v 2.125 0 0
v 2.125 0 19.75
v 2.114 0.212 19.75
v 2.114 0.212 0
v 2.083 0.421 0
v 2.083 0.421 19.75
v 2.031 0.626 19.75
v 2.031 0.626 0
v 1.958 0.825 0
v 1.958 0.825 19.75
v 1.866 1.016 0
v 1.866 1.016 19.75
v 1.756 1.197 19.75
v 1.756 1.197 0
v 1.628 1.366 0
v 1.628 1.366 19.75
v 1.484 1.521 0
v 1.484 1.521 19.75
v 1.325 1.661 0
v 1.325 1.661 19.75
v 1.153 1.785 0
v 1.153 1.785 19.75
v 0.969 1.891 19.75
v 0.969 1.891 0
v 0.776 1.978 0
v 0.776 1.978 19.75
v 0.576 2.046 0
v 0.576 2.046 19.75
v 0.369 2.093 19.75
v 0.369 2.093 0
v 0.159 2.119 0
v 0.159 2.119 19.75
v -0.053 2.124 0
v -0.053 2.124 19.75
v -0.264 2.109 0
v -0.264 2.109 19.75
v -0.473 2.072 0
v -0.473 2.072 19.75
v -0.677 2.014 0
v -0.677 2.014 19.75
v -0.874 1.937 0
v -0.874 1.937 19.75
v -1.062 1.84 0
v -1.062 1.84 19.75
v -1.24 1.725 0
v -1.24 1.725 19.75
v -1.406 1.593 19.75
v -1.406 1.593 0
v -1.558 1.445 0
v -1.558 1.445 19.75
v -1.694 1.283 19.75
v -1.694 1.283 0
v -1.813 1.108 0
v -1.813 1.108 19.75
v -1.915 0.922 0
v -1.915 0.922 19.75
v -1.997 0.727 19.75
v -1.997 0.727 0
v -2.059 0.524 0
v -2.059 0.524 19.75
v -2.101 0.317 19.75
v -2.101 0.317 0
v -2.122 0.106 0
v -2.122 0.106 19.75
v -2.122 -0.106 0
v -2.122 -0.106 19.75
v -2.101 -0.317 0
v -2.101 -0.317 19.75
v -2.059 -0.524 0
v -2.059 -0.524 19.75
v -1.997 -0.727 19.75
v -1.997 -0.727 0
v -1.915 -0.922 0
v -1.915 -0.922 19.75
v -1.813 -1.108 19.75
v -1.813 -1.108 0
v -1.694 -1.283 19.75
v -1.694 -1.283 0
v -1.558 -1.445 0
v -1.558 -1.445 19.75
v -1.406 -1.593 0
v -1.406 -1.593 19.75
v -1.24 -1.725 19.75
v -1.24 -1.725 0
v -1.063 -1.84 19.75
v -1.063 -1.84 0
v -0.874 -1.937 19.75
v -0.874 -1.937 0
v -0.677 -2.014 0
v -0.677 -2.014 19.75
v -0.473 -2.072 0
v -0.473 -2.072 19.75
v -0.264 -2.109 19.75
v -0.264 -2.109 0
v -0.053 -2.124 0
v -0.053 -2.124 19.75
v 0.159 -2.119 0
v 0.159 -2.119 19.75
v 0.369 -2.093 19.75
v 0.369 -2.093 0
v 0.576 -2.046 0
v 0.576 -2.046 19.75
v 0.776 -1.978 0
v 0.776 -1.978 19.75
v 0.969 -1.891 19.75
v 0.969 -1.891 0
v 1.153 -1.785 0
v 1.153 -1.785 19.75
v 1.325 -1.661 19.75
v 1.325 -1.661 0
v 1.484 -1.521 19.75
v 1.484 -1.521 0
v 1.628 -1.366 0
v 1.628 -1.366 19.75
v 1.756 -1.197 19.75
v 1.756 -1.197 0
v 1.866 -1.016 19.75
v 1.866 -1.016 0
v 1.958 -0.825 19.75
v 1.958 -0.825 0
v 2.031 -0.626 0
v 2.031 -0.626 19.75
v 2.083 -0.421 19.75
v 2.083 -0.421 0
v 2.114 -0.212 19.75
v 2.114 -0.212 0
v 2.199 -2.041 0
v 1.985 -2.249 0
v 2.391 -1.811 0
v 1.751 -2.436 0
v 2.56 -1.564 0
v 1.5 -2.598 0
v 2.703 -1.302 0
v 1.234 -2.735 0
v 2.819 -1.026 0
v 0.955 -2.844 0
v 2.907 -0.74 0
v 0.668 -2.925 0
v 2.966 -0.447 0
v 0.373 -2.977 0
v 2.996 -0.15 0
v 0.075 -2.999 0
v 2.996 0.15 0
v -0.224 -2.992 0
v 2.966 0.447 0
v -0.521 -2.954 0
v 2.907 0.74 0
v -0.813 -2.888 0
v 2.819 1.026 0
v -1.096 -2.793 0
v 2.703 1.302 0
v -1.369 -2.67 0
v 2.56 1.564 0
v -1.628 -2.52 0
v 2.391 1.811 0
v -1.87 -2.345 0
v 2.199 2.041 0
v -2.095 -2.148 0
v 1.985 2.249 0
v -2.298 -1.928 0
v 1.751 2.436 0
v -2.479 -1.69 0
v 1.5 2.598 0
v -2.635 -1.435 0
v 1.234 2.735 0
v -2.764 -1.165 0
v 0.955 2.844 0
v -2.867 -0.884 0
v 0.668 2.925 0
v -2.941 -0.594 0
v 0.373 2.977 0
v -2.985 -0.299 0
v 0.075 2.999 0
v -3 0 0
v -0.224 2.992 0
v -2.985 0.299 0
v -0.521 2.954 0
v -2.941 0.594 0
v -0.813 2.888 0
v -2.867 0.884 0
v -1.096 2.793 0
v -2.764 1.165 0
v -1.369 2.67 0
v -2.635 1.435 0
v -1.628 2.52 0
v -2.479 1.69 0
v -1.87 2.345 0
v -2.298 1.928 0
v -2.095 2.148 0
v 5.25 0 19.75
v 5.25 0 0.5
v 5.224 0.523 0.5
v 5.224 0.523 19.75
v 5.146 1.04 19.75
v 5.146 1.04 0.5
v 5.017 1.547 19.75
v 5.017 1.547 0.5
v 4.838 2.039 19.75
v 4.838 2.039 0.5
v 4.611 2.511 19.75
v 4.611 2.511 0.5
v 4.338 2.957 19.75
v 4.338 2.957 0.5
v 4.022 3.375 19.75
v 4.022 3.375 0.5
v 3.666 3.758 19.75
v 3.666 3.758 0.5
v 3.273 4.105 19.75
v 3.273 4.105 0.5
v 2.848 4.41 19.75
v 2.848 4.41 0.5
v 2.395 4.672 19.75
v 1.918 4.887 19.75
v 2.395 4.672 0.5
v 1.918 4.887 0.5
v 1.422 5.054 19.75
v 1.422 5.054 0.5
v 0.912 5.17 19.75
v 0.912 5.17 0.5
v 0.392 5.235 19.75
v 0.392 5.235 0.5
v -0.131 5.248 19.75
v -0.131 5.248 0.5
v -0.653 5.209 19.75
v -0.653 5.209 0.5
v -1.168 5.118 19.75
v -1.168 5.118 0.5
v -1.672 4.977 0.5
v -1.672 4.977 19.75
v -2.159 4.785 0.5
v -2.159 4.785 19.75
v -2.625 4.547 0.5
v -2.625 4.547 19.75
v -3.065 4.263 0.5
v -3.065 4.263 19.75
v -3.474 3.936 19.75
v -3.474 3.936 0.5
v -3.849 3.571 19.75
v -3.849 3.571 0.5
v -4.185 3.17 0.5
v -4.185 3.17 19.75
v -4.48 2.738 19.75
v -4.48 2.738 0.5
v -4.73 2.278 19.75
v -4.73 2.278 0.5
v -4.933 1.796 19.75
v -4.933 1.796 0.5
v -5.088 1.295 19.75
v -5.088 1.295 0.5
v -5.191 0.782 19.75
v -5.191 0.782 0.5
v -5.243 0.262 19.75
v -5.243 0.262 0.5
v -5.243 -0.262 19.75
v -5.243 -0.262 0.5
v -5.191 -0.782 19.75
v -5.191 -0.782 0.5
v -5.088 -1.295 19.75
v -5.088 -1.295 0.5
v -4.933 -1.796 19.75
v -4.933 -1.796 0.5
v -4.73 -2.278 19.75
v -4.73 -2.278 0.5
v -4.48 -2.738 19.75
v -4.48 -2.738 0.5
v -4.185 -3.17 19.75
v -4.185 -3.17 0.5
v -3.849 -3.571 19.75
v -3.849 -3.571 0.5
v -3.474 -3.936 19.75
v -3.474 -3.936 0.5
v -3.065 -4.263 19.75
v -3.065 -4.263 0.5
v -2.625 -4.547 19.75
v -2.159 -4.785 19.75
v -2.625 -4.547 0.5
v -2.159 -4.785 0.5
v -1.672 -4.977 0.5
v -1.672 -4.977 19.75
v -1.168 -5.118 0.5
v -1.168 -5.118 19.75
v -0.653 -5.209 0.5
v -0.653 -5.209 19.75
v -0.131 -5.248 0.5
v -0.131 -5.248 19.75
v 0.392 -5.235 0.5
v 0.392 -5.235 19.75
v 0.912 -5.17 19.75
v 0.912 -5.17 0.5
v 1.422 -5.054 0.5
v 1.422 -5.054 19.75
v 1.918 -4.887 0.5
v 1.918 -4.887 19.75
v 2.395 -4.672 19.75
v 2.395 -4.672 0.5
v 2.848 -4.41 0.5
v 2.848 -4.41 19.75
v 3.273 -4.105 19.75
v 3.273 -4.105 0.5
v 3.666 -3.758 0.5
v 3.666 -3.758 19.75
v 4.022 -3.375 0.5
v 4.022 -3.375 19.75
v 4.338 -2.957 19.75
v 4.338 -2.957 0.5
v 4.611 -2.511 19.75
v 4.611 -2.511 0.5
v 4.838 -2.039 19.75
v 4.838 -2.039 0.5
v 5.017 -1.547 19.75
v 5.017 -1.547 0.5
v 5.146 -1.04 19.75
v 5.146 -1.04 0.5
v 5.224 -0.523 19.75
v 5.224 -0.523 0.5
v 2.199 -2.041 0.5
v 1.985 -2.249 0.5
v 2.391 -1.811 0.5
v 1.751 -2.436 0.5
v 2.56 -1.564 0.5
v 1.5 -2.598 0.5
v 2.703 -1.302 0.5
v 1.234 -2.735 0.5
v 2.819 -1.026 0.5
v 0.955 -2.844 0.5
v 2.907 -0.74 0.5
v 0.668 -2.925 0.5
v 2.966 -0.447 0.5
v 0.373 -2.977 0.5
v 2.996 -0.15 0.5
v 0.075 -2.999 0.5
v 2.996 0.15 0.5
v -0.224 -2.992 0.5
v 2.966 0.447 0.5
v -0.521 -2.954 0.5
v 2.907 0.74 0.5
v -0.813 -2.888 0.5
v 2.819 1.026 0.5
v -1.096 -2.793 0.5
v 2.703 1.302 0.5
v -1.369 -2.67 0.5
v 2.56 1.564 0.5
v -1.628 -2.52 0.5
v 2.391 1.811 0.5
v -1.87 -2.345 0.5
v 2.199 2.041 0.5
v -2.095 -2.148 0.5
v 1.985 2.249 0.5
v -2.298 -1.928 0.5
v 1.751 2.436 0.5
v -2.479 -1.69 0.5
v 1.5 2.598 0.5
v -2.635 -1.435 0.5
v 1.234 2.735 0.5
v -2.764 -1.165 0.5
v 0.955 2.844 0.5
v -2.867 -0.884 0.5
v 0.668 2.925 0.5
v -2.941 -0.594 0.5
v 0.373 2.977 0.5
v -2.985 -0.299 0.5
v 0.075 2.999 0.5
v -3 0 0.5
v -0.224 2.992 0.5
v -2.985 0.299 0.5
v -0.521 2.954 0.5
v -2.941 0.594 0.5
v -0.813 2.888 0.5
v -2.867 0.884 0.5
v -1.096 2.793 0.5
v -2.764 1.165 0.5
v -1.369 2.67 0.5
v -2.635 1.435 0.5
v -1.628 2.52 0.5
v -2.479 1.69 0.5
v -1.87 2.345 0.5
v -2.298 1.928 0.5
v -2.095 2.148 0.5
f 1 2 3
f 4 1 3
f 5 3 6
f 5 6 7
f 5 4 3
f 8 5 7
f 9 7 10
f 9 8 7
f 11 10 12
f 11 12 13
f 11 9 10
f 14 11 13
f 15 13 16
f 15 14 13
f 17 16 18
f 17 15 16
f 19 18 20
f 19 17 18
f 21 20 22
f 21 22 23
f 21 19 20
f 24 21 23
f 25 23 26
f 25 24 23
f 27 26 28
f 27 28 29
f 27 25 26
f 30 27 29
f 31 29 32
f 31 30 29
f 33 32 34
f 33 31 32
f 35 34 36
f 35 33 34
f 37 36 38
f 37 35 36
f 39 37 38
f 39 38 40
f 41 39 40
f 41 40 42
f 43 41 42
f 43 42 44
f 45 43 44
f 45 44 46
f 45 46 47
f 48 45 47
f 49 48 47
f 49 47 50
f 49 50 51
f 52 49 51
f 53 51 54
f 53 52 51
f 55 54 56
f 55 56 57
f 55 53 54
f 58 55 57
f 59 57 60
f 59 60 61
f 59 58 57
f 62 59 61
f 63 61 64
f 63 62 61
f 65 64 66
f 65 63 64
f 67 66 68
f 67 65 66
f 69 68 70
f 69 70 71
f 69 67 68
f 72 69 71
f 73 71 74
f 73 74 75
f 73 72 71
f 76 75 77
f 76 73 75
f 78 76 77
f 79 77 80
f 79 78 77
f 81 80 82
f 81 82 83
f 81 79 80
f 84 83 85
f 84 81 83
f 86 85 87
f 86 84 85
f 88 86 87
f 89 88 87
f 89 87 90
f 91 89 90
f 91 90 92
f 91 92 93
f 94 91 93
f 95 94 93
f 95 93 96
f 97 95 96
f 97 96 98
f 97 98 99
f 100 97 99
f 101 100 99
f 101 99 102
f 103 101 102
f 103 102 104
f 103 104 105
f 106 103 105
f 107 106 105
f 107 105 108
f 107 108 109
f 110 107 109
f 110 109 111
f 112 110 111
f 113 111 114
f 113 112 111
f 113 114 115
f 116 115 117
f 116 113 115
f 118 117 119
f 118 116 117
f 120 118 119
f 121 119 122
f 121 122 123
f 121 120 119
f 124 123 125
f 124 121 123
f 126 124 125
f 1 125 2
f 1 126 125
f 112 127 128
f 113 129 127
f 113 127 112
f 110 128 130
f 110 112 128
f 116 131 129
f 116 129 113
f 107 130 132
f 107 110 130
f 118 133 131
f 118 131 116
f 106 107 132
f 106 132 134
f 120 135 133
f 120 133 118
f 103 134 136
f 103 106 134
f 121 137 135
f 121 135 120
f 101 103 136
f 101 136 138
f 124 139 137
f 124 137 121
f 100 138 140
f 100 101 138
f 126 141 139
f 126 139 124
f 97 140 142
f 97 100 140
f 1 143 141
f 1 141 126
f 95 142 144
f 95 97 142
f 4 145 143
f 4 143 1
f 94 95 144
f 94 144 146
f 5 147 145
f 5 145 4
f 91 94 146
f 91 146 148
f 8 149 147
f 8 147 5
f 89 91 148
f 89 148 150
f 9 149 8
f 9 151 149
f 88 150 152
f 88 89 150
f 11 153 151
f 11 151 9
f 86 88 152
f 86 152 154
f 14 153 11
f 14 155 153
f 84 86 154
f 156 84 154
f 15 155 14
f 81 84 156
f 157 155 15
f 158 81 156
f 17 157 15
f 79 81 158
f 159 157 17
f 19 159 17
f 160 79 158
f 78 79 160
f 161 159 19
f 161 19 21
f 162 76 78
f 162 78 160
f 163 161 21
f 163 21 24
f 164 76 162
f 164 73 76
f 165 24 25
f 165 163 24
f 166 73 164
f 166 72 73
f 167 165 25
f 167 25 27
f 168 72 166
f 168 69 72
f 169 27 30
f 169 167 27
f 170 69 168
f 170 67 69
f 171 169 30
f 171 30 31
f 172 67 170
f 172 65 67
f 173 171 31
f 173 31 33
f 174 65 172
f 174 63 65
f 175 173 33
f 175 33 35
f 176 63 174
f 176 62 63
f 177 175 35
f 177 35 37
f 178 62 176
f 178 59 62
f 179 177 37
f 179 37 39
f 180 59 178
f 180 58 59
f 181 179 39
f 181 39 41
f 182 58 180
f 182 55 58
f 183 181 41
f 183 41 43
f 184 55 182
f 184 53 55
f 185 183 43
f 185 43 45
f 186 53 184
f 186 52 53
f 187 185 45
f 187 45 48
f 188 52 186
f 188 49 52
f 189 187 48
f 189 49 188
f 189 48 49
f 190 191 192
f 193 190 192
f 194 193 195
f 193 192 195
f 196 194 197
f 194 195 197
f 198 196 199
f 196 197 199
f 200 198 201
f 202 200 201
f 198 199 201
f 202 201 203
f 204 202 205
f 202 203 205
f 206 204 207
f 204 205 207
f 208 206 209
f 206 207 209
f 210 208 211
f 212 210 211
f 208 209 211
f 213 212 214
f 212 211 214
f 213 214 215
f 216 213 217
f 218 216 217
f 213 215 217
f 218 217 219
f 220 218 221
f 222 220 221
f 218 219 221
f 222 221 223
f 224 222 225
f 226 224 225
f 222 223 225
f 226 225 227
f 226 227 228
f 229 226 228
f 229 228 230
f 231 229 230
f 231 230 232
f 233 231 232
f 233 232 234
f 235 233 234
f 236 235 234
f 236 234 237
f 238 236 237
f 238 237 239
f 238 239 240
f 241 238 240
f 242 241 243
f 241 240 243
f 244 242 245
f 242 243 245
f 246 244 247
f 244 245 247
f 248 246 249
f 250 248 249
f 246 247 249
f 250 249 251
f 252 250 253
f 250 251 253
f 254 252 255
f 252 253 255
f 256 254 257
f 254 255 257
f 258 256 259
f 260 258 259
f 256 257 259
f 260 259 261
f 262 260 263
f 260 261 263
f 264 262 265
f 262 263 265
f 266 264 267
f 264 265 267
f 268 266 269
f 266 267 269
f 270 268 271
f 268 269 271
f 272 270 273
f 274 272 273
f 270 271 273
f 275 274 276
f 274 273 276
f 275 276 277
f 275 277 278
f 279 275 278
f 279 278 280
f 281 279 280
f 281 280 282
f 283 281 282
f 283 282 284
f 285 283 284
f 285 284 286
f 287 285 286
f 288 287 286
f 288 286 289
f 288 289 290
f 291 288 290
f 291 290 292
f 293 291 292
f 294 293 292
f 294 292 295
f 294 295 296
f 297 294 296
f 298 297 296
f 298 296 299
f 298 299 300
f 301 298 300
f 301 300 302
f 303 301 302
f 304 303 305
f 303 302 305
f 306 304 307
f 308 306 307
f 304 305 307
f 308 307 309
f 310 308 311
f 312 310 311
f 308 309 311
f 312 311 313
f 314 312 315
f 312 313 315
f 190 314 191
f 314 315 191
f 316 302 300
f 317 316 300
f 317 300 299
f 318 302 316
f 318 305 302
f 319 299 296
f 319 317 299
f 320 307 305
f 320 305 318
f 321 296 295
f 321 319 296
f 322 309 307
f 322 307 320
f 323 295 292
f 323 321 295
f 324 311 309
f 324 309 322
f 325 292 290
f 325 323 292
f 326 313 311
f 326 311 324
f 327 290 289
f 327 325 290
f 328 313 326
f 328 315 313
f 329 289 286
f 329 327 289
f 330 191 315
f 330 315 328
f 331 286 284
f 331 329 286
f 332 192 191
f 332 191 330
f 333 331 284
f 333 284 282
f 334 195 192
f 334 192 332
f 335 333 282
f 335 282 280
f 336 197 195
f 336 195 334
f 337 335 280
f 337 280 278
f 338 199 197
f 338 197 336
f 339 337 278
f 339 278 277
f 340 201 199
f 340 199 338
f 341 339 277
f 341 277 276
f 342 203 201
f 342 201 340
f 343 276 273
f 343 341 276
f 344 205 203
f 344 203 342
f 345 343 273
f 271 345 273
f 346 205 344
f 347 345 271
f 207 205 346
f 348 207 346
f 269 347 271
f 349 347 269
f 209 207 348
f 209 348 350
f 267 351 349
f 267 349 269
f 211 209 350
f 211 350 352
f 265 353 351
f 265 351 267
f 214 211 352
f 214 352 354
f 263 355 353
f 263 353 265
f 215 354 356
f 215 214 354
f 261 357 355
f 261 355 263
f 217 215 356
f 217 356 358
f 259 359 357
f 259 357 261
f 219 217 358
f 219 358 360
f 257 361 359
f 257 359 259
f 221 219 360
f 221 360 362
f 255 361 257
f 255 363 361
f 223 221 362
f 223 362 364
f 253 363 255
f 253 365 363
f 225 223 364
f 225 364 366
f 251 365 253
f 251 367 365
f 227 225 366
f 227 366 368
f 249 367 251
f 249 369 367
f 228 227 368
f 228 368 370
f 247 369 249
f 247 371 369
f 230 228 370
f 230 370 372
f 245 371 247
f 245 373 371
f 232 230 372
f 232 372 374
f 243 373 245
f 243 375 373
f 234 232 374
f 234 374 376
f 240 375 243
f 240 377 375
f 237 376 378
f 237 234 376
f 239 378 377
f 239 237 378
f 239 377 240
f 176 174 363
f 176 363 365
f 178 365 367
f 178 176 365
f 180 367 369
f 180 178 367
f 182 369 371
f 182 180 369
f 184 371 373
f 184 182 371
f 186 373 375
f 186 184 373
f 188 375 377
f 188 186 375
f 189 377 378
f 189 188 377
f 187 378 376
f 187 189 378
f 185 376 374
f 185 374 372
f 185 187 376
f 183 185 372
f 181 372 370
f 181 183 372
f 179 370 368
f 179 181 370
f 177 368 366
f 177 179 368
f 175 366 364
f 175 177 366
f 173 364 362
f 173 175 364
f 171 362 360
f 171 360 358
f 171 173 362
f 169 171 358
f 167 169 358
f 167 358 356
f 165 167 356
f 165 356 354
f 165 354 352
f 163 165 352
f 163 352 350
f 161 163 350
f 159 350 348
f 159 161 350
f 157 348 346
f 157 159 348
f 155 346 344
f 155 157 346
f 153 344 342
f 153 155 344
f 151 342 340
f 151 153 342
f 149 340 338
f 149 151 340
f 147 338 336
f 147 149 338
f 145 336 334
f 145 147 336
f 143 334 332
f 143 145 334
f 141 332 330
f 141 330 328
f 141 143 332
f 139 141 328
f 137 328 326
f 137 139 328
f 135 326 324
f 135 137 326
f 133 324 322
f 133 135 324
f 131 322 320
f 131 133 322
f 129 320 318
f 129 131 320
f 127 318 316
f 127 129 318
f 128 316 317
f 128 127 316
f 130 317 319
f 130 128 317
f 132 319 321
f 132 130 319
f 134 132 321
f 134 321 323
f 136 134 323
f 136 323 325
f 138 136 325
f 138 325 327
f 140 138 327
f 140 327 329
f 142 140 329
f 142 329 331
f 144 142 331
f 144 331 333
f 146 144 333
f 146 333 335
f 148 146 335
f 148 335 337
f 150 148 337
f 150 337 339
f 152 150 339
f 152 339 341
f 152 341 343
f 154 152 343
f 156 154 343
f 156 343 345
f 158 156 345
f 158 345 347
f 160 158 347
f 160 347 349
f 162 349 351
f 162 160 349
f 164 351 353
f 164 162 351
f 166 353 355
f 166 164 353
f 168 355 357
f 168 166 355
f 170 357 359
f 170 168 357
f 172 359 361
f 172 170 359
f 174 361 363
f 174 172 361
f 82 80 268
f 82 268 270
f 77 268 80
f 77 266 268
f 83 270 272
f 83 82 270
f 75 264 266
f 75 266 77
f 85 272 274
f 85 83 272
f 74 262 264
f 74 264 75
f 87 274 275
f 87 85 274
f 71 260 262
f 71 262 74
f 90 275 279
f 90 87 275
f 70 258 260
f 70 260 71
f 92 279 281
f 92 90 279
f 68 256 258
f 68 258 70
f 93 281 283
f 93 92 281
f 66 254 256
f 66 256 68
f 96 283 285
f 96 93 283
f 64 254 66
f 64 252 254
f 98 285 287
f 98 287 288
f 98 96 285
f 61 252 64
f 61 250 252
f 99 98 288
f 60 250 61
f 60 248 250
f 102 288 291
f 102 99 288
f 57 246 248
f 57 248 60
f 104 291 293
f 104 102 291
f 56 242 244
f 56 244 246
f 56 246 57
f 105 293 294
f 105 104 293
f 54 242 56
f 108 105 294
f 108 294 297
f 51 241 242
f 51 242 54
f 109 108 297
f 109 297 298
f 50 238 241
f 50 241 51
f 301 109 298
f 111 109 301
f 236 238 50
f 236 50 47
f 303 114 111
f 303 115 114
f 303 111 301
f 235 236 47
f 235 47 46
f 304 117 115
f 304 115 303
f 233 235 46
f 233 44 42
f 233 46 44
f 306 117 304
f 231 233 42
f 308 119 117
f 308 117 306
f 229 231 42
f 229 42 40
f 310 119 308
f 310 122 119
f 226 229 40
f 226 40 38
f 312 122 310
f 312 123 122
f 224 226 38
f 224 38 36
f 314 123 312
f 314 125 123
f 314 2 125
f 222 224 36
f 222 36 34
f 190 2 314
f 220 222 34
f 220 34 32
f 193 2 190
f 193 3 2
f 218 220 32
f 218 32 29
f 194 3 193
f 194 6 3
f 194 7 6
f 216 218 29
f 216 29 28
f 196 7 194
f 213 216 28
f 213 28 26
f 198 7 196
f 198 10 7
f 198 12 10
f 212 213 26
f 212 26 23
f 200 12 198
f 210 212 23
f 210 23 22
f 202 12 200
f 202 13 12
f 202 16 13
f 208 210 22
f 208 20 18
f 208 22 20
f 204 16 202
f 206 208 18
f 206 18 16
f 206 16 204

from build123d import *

# Parameters (mm, degrees)
SKETCH1_W           = 3.125
SKETCH1_H           = 3.75
SKETCH2_R           = 5.25
SKETCH2_R_2         = 2.125
BOSS_EXTRUDE1_DEPTH = 16
SKETCH3_R           = 5.25
SKETCH3_R_2         = 3
CUT_EXTRUDE1_DEPTH  = 0.5


with BuildPart() as part:
    # Sketch1 → Revolve1 (revolve)
    with BuildSketch(Plane(origin=(0, 0, 0), x_dir=(1, 0, 0), z_dir=(0, 1, 0))):
        with Locations((3.6875, -1.875)):
            Rectangle(SKETCH1_W, SKETCH1_H)
    revolve(axis=Axis((0, 0, 0), (0, 0, 1)))

    # Sketch2 → Boss-Extrude1 (add)
    with BuildSketch(Plane.XY.offset(3.75)):
        Circle(SKETCH2_R)
        Circle(SKETCH2_R_2, mode=Mode.SUBTRACT)
    extrude(amount=BOSS_EXTRUDE1_DEPTH)

    # Sketch3 → Cut-Extrude1 (cut)
    with BuildSketch(Plane(origin=(0, 0, 0), x_dir=(-1, 0, 0), z_dir=(0, 0, -1))):
        Circle(SKETCH3_R)
        Circle(SKETCH3_R_2, mode=Mode.SUBTRACT)
    extrude(amount=-CUT_EXTRUDE1_DEPTH, mode=Mode.SUBTRACT)


solid = part.part
